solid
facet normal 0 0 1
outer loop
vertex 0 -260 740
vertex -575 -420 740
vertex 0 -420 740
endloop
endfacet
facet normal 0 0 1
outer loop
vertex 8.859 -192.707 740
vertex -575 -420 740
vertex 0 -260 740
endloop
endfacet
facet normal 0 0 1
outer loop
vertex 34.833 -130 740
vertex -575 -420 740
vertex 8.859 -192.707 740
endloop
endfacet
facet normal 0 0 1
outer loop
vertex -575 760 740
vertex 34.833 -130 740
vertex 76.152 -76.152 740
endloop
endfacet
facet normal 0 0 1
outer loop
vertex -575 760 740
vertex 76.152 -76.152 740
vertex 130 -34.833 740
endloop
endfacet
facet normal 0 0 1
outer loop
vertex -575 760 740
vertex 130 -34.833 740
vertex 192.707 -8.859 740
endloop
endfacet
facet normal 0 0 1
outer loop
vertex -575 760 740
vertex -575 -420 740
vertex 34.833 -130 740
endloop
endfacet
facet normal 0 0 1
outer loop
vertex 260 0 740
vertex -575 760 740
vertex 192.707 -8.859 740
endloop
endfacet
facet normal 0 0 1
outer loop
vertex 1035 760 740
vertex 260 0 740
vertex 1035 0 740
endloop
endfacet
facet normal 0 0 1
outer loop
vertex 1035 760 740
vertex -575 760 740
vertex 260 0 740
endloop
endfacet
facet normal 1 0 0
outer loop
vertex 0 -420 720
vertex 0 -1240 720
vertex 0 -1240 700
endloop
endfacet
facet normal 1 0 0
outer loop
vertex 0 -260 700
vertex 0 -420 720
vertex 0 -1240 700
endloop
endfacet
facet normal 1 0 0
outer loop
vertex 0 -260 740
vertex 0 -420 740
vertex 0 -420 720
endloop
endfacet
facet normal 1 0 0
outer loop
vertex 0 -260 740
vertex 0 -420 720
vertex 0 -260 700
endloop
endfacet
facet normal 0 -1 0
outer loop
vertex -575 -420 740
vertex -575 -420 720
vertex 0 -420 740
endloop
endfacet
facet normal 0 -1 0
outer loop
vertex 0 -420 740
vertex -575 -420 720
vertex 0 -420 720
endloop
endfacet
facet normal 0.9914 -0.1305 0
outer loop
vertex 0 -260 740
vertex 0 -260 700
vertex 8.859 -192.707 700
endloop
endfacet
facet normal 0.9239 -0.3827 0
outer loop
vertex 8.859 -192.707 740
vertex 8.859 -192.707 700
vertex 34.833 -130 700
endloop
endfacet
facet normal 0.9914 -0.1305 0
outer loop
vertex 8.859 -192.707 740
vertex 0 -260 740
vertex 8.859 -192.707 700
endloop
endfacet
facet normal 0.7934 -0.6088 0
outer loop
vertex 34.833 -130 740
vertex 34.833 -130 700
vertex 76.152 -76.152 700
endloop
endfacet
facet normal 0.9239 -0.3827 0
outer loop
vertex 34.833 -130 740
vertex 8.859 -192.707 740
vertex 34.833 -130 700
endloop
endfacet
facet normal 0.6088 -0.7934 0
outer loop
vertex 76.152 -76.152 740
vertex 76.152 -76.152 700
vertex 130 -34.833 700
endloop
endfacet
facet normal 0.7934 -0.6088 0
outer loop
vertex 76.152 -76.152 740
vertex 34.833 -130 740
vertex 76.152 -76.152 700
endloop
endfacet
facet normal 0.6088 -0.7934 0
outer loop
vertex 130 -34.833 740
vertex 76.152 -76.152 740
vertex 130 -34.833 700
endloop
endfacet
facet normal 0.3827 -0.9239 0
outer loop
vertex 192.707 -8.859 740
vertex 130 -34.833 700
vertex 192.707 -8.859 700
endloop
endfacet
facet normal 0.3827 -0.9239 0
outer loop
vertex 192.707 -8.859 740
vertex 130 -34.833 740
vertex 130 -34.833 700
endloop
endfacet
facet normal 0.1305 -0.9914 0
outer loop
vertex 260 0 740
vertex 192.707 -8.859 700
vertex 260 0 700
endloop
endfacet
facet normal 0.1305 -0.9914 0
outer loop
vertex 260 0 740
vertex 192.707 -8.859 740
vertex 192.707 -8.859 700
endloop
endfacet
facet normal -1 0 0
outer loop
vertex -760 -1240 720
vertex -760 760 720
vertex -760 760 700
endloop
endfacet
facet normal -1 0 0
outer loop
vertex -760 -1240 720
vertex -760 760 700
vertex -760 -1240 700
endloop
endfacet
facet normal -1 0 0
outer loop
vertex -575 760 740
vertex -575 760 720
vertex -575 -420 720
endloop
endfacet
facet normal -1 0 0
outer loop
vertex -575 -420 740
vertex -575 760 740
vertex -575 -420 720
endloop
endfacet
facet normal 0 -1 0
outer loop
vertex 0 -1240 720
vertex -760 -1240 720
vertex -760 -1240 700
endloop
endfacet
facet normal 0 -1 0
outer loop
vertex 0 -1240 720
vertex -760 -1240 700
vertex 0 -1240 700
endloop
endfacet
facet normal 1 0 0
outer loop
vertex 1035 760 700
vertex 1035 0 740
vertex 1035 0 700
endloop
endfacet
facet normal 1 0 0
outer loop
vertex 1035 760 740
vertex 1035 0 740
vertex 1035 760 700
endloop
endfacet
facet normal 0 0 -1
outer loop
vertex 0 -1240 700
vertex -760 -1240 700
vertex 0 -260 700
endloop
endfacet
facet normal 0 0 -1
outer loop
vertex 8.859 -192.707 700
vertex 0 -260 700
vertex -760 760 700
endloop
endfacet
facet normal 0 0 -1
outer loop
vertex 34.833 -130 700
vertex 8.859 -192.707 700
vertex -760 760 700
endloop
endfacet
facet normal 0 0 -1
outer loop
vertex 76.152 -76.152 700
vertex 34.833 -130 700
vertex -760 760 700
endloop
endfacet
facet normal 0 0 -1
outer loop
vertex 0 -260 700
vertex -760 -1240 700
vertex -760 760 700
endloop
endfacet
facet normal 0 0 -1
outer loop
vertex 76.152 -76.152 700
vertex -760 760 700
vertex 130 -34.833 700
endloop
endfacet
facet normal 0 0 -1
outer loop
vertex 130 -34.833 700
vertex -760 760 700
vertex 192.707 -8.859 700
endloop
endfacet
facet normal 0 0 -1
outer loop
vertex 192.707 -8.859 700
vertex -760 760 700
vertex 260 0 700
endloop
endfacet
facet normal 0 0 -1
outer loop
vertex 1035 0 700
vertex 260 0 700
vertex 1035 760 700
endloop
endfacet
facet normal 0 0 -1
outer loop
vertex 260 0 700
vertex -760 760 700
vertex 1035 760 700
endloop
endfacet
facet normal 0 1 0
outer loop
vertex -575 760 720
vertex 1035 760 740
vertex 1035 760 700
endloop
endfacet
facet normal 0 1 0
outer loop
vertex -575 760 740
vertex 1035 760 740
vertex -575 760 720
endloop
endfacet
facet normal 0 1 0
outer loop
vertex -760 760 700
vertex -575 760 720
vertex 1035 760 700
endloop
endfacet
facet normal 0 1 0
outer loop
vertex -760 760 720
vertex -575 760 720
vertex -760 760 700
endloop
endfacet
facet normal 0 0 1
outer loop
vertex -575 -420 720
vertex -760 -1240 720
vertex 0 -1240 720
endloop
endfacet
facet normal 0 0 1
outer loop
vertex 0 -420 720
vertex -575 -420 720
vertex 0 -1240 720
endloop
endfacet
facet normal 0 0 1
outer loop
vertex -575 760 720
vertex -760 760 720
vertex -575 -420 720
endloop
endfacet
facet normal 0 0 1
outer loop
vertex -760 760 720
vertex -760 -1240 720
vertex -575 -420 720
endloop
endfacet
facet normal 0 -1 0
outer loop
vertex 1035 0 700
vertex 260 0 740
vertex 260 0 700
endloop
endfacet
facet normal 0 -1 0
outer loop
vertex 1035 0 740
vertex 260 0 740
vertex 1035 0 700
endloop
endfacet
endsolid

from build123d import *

# Parameters (mm, degrees)
F5_DEPTH = 20
F6_DEPTH = 20


# Not quite as in the source:
# - the program builds the solid bodies; features that only make, move or delete a surface that nothing else refers to are left out


with BuildPart() as f5:
    # F4 (on offset) → F5 (new body)
    with BuildSketch(Plane.XY.offset(720)):
        with BuildLine():
            ThreePointArc((0, -260), (76.1522368915, -76.1522368915), (260, 0))
            Line((260, 0), (1035, 0))
            Line((1035, 0), (1035, 760))
            Line((1035, 760), (-575, 760))
            Line((-575, 760), (-575, -420))
            Line((-575, -420), (0, -420))
            Line((0, -420), (0, -260))
        make_face()
    extrude(amount=F5_DEPTH)

    # F4 (on offset) → F6 (join)
    with BuildSketch(Plane.XY.offset(720)):
        with BuildLine():
            ThreePointArc((0, -260), (76.1522368915, -76.1522368915), (260, 0))
            Line((260, 0), (1035, 0))
            Line((1035, 0), (1035, 760))
            Line((1035, 760), (-575, 760))
            Line((-575, 760), (-575, -420))
            Line((-575, -420), (0, -420))
            Line((0, -420), (0, -260))
        make_face()
        Polygon((0, -1240), (0, -420), (-575, -420), (-575, 760), (-760, 760), (-760, -1240), align=None)
    extrude(amount=-F6_DEPTH)


solid = f5.part
